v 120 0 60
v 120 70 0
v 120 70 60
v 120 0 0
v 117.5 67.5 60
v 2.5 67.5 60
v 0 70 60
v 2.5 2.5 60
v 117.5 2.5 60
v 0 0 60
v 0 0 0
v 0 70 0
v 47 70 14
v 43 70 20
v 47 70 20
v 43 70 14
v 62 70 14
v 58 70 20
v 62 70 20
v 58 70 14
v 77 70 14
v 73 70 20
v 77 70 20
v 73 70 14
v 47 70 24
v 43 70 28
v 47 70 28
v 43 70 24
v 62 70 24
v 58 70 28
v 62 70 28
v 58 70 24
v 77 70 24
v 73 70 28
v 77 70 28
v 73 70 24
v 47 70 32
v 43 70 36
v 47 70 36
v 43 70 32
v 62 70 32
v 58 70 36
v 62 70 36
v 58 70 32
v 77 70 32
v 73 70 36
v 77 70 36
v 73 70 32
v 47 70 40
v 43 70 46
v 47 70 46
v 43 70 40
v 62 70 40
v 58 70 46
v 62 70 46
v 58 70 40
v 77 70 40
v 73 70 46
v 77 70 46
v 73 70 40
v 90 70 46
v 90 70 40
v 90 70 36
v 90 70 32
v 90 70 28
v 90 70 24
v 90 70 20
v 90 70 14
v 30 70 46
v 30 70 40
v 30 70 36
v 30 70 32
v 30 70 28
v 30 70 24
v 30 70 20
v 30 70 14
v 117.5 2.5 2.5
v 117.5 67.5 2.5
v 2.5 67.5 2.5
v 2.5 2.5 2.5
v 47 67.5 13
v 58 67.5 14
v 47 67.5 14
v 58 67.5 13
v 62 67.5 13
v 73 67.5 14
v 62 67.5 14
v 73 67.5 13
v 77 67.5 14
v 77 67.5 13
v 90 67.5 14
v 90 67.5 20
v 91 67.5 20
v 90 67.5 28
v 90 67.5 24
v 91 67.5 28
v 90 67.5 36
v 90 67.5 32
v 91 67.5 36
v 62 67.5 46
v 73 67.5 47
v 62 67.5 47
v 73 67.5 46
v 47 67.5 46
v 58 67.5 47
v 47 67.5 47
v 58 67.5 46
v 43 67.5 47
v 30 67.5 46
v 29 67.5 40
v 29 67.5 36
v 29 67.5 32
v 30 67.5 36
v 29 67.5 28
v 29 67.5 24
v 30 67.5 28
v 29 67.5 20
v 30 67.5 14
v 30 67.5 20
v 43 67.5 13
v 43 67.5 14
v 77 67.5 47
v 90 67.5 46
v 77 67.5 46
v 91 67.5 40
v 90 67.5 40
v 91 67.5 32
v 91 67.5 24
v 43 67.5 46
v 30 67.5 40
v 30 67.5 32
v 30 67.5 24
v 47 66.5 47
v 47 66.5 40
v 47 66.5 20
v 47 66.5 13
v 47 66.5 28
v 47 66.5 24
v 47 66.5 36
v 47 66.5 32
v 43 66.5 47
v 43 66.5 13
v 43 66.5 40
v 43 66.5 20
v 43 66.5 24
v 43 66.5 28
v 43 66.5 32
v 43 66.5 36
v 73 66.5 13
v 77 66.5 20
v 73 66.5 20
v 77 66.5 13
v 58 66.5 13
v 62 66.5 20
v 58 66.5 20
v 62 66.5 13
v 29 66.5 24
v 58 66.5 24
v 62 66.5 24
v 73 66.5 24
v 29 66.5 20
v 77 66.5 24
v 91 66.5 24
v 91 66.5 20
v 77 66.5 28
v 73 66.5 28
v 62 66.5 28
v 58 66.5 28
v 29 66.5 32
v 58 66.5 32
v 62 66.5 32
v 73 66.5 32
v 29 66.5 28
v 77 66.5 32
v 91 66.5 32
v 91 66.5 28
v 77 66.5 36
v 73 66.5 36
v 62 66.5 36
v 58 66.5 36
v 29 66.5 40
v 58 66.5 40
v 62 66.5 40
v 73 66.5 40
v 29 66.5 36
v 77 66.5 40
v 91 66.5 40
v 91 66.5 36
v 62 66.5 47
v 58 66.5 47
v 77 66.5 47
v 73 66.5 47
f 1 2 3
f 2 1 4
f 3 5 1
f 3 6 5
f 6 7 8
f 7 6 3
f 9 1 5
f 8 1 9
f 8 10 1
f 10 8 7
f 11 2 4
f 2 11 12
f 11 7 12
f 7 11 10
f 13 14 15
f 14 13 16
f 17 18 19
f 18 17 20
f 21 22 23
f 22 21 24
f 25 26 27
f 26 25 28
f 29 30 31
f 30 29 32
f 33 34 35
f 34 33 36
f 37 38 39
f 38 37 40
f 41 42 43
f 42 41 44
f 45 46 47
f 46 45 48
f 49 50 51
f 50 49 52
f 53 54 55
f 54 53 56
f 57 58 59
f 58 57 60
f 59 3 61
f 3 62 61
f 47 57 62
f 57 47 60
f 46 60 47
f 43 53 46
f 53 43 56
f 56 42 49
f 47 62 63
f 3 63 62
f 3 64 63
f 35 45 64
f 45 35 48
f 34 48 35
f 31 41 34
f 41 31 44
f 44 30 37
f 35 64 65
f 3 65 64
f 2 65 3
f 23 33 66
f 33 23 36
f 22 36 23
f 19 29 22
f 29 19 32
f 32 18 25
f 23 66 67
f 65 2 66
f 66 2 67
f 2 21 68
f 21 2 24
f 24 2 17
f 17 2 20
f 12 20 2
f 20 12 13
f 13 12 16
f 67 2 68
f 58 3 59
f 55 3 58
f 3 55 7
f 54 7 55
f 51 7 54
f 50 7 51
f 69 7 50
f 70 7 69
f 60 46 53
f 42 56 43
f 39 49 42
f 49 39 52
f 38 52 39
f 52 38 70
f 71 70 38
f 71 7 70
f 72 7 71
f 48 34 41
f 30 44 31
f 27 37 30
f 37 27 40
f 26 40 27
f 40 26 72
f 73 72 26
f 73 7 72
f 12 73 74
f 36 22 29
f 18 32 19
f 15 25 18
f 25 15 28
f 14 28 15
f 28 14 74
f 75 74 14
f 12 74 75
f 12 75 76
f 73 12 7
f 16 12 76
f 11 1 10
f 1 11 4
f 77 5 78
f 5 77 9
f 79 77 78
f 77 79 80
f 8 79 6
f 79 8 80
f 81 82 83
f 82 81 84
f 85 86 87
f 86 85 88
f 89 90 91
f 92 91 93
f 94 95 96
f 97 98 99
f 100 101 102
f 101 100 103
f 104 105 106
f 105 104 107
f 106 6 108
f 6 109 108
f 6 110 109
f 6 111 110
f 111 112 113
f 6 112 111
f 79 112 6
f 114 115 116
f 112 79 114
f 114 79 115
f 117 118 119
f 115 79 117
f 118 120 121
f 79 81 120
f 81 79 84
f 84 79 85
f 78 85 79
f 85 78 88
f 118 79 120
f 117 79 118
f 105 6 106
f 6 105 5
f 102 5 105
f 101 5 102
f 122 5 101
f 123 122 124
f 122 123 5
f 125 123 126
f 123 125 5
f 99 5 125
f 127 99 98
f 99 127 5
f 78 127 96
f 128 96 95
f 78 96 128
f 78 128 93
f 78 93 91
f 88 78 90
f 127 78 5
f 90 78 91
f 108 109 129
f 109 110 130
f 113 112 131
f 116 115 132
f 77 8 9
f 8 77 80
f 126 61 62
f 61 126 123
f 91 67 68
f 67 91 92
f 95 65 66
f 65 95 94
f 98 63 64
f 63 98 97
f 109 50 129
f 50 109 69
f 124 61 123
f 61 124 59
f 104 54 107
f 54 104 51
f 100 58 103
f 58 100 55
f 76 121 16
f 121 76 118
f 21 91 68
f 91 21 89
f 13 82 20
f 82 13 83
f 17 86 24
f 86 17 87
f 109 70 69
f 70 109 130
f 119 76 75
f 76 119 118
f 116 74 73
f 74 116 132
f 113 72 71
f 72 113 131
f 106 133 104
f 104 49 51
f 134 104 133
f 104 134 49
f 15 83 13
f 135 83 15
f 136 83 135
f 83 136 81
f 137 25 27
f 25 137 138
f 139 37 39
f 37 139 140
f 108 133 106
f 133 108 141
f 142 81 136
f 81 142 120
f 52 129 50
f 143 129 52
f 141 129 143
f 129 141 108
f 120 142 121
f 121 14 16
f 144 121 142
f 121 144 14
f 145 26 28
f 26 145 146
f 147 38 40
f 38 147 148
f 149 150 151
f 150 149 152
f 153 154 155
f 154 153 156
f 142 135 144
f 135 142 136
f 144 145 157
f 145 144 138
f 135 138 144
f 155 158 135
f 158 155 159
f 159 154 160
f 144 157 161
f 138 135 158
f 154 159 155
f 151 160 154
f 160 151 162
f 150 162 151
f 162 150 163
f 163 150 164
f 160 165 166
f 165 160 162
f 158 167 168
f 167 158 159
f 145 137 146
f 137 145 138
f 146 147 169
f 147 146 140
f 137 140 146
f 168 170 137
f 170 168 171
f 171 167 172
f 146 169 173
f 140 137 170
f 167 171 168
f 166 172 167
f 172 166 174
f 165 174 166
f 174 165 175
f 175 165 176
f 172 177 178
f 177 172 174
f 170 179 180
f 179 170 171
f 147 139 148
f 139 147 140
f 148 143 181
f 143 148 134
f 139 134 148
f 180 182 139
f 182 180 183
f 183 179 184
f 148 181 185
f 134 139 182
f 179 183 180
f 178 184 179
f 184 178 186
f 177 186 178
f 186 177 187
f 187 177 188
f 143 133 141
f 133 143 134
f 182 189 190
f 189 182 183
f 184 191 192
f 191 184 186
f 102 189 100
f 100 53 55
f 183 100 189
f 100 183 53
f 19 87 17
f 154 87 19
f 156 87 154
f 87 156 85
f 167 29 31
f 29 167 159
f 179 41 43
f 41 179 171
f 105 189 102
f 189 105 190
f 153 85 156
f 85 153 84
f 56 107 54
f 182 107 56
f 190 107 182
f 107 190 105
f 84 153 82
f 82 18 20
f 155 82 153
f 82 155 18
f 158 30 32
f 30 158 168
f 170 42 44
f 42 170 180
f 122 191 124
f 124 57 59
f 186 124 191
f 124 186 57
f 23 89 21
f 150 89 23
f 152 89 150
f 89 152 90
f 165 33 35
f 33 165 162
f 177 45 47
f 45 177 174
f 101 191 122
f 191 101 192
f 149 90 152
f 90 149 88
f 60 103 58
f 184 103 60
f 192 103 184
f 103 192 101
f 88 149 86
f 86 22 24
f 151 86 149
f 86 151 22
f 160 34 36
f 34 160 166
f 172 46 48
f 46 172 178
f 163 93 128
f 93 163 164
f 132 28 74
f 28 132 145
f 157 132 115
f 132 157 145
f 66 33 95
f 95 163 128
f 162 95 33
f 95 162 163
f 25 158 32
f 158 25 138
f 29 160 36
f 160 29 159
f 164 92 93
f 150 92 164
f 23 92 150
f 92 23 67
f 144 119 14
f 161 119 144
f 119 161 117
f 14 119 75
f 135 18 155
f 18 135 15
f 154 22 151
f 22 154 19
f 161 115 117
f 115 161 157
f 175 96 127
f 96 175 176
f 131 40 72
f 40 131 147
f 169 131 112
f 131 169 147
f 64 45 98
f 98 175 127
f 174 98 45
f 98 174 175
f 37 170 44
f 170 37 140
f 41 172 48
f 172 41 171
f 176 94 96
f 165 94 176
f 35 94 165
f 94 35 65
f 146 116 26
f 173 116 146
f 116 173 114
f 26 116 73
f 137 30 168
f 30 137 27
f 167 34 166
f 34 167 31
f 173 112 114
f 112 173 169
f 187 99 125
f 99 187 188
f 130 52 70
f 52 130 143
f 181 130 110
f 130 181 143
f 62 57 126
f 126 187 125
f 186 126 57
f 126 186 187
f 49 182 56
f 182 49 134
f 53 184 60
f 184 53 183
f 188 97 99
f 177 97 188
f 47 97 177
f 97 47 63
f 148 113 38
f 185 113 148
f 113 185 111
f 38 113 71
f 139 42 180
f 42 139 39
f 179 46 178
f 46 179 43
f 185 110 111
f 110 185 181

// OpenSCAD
$fn = 32;

// ----------------------------------------------------------------------
// Vent box: crossgrid enclosure
// ----------------------------------------------------------------------

// --- parameters (mm) ---
box_l = 120;              // box length, X
box_w = 70;               // box width, Y
box_h = 60;               // box height, Z
wall_t = 2.5;             // shell wall thickness
win_l = 60;               // vent window width, X
win_h = 32;               // vent window height, Z
bar_w = 4;                // grid bar width
n_v = 3;                  // vertical bar count
n_h = 3;                  // horizontal bar count

win_z0 = (box_h - win_h) / 2;  // window lower edge Z
v_step = win_l / (n_v + 1);  // vertical bar step
h_step = win_h / (n_h + 1);  // horizontal bar step

difference() {
  union() {
    difference() {
      cube([box_l, box_w, box_h]);
  translate([wall_t, wall_t, wall_t])
    cube([box_l - 2 * wall_t, box_w - 2 * wall_t, box_h]);
  translate([(box_l - win_l) / 2, box_w - wall_t - 1, win_z0])
    cube([win_l, wall_t + 2, win_h]);
    }
    for (i = [1 : n_v])
      translate([(box_l - win_l) / 2 + i * v_step - bar_w / 2,
                 box_w - wall_t - 1, win_z0 - 1])
        cube([bar_w, wall_t + 1, win_h + 2]);
    for (i = [1 : n_h])
      translate([(box_l - win_l) / 2 - 1, box_w - wall_t - 1,
                 win_z0 + i * h_step - bar_w / 2])
        cube([win_l + 2, wall_t + 1, bar_w]);
  }
}
